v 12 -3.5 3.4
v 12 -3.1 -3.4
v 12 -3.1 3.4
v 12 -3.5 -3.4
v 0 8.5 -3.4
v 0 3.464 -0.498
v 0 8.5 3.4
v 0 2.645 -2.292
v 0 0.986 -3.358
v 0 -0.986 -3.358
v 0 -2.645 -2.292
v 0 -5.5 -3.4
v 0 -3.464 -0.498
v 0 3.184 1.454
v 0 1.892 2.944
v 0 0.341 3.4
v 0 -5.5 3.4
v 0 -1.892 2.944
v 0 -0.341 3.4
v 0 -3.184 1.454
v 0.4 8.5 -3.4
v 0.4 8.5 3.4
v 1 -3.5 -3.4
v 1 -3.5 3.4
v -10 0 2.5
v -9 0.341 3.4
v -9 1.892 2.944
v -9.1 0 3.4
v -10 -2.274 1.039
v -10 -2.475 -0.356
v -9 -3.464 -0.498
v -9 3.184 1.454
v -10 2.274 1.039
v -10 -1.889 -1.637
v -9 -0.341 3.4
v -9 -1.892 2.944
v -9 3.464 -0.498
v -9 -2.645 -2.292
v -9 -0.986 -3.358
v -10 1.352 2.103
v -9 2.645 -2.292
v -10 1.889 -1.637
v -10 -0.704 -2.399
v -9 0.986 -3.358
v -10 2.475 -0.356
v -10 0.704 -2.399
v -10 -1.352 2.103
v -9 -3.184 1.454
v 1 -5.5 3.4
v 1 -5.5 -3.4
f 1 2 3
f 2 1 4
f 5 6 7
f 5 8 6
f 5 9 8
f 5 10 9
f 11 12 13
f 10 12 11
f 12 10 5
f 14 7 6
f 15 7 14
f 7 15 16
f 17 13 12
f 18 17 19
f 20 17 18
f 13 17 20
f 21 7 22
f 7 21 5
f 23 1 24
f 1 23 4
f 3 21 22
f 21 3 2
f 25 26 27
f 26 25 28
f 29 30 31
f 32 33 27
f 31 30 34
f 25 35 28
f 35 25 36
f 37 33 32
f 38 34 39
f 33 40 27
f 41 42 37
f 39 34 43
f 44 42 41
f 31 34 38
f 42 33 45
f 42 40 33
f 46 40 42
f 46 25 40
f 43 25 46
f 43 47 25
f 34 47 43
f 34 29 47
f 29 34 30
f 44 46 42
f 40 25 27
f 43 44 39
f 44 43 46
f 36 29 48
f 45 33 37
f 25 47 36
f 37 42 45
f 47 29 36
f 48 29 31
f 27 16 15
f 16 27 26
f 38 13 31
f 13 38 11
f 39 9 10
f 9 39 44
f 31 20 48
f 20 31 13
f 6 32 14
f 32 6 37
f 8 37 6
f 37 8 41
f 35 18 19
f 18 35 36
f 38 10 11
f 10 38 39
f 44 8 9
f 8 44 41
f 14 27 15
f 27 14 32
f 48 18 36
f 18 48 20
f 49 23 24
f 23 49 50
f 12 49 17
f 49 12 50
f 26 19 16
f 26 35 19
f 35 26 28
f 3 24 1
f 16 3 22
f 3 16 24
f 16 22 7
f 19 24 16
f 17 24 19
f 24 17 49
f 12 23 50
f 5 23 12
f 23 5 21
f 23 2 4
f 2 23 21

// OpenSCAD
// Diameter of hole in side board of bookcase or wardrobe
hole_diameter = 7; 

// Deep of hole
hole_deep = 10;

// Length of outer part of peg
length = 12;

intersection() {
	union() {
		translate([-hole_deep+1,0,0]) rotate([0,-90,0]) cylinder(r1=hole_diameter/2, r2=hole_diameter/2-1, h=1);
		rotate([0,-90,0]) cylinder(r=hole_diameter/2, h=hole_deep-1);
		difference() {
			translate([0,-hole_diameter/2,-hole_diameter/2]) cube([length,length,hole_diameter]);
			translate([length*0.7+0.5,0,0]) rotate([0,0,45]) translate([0,-50,-50]) cube([100,100,100]);
		}
		translate([0,-hole_diameter/2-2,-hole_diameter/2]) cube([1,length,hole_diameter]);
	}
	cube([100,100,hole_diameter-0.2], center=true);
}
